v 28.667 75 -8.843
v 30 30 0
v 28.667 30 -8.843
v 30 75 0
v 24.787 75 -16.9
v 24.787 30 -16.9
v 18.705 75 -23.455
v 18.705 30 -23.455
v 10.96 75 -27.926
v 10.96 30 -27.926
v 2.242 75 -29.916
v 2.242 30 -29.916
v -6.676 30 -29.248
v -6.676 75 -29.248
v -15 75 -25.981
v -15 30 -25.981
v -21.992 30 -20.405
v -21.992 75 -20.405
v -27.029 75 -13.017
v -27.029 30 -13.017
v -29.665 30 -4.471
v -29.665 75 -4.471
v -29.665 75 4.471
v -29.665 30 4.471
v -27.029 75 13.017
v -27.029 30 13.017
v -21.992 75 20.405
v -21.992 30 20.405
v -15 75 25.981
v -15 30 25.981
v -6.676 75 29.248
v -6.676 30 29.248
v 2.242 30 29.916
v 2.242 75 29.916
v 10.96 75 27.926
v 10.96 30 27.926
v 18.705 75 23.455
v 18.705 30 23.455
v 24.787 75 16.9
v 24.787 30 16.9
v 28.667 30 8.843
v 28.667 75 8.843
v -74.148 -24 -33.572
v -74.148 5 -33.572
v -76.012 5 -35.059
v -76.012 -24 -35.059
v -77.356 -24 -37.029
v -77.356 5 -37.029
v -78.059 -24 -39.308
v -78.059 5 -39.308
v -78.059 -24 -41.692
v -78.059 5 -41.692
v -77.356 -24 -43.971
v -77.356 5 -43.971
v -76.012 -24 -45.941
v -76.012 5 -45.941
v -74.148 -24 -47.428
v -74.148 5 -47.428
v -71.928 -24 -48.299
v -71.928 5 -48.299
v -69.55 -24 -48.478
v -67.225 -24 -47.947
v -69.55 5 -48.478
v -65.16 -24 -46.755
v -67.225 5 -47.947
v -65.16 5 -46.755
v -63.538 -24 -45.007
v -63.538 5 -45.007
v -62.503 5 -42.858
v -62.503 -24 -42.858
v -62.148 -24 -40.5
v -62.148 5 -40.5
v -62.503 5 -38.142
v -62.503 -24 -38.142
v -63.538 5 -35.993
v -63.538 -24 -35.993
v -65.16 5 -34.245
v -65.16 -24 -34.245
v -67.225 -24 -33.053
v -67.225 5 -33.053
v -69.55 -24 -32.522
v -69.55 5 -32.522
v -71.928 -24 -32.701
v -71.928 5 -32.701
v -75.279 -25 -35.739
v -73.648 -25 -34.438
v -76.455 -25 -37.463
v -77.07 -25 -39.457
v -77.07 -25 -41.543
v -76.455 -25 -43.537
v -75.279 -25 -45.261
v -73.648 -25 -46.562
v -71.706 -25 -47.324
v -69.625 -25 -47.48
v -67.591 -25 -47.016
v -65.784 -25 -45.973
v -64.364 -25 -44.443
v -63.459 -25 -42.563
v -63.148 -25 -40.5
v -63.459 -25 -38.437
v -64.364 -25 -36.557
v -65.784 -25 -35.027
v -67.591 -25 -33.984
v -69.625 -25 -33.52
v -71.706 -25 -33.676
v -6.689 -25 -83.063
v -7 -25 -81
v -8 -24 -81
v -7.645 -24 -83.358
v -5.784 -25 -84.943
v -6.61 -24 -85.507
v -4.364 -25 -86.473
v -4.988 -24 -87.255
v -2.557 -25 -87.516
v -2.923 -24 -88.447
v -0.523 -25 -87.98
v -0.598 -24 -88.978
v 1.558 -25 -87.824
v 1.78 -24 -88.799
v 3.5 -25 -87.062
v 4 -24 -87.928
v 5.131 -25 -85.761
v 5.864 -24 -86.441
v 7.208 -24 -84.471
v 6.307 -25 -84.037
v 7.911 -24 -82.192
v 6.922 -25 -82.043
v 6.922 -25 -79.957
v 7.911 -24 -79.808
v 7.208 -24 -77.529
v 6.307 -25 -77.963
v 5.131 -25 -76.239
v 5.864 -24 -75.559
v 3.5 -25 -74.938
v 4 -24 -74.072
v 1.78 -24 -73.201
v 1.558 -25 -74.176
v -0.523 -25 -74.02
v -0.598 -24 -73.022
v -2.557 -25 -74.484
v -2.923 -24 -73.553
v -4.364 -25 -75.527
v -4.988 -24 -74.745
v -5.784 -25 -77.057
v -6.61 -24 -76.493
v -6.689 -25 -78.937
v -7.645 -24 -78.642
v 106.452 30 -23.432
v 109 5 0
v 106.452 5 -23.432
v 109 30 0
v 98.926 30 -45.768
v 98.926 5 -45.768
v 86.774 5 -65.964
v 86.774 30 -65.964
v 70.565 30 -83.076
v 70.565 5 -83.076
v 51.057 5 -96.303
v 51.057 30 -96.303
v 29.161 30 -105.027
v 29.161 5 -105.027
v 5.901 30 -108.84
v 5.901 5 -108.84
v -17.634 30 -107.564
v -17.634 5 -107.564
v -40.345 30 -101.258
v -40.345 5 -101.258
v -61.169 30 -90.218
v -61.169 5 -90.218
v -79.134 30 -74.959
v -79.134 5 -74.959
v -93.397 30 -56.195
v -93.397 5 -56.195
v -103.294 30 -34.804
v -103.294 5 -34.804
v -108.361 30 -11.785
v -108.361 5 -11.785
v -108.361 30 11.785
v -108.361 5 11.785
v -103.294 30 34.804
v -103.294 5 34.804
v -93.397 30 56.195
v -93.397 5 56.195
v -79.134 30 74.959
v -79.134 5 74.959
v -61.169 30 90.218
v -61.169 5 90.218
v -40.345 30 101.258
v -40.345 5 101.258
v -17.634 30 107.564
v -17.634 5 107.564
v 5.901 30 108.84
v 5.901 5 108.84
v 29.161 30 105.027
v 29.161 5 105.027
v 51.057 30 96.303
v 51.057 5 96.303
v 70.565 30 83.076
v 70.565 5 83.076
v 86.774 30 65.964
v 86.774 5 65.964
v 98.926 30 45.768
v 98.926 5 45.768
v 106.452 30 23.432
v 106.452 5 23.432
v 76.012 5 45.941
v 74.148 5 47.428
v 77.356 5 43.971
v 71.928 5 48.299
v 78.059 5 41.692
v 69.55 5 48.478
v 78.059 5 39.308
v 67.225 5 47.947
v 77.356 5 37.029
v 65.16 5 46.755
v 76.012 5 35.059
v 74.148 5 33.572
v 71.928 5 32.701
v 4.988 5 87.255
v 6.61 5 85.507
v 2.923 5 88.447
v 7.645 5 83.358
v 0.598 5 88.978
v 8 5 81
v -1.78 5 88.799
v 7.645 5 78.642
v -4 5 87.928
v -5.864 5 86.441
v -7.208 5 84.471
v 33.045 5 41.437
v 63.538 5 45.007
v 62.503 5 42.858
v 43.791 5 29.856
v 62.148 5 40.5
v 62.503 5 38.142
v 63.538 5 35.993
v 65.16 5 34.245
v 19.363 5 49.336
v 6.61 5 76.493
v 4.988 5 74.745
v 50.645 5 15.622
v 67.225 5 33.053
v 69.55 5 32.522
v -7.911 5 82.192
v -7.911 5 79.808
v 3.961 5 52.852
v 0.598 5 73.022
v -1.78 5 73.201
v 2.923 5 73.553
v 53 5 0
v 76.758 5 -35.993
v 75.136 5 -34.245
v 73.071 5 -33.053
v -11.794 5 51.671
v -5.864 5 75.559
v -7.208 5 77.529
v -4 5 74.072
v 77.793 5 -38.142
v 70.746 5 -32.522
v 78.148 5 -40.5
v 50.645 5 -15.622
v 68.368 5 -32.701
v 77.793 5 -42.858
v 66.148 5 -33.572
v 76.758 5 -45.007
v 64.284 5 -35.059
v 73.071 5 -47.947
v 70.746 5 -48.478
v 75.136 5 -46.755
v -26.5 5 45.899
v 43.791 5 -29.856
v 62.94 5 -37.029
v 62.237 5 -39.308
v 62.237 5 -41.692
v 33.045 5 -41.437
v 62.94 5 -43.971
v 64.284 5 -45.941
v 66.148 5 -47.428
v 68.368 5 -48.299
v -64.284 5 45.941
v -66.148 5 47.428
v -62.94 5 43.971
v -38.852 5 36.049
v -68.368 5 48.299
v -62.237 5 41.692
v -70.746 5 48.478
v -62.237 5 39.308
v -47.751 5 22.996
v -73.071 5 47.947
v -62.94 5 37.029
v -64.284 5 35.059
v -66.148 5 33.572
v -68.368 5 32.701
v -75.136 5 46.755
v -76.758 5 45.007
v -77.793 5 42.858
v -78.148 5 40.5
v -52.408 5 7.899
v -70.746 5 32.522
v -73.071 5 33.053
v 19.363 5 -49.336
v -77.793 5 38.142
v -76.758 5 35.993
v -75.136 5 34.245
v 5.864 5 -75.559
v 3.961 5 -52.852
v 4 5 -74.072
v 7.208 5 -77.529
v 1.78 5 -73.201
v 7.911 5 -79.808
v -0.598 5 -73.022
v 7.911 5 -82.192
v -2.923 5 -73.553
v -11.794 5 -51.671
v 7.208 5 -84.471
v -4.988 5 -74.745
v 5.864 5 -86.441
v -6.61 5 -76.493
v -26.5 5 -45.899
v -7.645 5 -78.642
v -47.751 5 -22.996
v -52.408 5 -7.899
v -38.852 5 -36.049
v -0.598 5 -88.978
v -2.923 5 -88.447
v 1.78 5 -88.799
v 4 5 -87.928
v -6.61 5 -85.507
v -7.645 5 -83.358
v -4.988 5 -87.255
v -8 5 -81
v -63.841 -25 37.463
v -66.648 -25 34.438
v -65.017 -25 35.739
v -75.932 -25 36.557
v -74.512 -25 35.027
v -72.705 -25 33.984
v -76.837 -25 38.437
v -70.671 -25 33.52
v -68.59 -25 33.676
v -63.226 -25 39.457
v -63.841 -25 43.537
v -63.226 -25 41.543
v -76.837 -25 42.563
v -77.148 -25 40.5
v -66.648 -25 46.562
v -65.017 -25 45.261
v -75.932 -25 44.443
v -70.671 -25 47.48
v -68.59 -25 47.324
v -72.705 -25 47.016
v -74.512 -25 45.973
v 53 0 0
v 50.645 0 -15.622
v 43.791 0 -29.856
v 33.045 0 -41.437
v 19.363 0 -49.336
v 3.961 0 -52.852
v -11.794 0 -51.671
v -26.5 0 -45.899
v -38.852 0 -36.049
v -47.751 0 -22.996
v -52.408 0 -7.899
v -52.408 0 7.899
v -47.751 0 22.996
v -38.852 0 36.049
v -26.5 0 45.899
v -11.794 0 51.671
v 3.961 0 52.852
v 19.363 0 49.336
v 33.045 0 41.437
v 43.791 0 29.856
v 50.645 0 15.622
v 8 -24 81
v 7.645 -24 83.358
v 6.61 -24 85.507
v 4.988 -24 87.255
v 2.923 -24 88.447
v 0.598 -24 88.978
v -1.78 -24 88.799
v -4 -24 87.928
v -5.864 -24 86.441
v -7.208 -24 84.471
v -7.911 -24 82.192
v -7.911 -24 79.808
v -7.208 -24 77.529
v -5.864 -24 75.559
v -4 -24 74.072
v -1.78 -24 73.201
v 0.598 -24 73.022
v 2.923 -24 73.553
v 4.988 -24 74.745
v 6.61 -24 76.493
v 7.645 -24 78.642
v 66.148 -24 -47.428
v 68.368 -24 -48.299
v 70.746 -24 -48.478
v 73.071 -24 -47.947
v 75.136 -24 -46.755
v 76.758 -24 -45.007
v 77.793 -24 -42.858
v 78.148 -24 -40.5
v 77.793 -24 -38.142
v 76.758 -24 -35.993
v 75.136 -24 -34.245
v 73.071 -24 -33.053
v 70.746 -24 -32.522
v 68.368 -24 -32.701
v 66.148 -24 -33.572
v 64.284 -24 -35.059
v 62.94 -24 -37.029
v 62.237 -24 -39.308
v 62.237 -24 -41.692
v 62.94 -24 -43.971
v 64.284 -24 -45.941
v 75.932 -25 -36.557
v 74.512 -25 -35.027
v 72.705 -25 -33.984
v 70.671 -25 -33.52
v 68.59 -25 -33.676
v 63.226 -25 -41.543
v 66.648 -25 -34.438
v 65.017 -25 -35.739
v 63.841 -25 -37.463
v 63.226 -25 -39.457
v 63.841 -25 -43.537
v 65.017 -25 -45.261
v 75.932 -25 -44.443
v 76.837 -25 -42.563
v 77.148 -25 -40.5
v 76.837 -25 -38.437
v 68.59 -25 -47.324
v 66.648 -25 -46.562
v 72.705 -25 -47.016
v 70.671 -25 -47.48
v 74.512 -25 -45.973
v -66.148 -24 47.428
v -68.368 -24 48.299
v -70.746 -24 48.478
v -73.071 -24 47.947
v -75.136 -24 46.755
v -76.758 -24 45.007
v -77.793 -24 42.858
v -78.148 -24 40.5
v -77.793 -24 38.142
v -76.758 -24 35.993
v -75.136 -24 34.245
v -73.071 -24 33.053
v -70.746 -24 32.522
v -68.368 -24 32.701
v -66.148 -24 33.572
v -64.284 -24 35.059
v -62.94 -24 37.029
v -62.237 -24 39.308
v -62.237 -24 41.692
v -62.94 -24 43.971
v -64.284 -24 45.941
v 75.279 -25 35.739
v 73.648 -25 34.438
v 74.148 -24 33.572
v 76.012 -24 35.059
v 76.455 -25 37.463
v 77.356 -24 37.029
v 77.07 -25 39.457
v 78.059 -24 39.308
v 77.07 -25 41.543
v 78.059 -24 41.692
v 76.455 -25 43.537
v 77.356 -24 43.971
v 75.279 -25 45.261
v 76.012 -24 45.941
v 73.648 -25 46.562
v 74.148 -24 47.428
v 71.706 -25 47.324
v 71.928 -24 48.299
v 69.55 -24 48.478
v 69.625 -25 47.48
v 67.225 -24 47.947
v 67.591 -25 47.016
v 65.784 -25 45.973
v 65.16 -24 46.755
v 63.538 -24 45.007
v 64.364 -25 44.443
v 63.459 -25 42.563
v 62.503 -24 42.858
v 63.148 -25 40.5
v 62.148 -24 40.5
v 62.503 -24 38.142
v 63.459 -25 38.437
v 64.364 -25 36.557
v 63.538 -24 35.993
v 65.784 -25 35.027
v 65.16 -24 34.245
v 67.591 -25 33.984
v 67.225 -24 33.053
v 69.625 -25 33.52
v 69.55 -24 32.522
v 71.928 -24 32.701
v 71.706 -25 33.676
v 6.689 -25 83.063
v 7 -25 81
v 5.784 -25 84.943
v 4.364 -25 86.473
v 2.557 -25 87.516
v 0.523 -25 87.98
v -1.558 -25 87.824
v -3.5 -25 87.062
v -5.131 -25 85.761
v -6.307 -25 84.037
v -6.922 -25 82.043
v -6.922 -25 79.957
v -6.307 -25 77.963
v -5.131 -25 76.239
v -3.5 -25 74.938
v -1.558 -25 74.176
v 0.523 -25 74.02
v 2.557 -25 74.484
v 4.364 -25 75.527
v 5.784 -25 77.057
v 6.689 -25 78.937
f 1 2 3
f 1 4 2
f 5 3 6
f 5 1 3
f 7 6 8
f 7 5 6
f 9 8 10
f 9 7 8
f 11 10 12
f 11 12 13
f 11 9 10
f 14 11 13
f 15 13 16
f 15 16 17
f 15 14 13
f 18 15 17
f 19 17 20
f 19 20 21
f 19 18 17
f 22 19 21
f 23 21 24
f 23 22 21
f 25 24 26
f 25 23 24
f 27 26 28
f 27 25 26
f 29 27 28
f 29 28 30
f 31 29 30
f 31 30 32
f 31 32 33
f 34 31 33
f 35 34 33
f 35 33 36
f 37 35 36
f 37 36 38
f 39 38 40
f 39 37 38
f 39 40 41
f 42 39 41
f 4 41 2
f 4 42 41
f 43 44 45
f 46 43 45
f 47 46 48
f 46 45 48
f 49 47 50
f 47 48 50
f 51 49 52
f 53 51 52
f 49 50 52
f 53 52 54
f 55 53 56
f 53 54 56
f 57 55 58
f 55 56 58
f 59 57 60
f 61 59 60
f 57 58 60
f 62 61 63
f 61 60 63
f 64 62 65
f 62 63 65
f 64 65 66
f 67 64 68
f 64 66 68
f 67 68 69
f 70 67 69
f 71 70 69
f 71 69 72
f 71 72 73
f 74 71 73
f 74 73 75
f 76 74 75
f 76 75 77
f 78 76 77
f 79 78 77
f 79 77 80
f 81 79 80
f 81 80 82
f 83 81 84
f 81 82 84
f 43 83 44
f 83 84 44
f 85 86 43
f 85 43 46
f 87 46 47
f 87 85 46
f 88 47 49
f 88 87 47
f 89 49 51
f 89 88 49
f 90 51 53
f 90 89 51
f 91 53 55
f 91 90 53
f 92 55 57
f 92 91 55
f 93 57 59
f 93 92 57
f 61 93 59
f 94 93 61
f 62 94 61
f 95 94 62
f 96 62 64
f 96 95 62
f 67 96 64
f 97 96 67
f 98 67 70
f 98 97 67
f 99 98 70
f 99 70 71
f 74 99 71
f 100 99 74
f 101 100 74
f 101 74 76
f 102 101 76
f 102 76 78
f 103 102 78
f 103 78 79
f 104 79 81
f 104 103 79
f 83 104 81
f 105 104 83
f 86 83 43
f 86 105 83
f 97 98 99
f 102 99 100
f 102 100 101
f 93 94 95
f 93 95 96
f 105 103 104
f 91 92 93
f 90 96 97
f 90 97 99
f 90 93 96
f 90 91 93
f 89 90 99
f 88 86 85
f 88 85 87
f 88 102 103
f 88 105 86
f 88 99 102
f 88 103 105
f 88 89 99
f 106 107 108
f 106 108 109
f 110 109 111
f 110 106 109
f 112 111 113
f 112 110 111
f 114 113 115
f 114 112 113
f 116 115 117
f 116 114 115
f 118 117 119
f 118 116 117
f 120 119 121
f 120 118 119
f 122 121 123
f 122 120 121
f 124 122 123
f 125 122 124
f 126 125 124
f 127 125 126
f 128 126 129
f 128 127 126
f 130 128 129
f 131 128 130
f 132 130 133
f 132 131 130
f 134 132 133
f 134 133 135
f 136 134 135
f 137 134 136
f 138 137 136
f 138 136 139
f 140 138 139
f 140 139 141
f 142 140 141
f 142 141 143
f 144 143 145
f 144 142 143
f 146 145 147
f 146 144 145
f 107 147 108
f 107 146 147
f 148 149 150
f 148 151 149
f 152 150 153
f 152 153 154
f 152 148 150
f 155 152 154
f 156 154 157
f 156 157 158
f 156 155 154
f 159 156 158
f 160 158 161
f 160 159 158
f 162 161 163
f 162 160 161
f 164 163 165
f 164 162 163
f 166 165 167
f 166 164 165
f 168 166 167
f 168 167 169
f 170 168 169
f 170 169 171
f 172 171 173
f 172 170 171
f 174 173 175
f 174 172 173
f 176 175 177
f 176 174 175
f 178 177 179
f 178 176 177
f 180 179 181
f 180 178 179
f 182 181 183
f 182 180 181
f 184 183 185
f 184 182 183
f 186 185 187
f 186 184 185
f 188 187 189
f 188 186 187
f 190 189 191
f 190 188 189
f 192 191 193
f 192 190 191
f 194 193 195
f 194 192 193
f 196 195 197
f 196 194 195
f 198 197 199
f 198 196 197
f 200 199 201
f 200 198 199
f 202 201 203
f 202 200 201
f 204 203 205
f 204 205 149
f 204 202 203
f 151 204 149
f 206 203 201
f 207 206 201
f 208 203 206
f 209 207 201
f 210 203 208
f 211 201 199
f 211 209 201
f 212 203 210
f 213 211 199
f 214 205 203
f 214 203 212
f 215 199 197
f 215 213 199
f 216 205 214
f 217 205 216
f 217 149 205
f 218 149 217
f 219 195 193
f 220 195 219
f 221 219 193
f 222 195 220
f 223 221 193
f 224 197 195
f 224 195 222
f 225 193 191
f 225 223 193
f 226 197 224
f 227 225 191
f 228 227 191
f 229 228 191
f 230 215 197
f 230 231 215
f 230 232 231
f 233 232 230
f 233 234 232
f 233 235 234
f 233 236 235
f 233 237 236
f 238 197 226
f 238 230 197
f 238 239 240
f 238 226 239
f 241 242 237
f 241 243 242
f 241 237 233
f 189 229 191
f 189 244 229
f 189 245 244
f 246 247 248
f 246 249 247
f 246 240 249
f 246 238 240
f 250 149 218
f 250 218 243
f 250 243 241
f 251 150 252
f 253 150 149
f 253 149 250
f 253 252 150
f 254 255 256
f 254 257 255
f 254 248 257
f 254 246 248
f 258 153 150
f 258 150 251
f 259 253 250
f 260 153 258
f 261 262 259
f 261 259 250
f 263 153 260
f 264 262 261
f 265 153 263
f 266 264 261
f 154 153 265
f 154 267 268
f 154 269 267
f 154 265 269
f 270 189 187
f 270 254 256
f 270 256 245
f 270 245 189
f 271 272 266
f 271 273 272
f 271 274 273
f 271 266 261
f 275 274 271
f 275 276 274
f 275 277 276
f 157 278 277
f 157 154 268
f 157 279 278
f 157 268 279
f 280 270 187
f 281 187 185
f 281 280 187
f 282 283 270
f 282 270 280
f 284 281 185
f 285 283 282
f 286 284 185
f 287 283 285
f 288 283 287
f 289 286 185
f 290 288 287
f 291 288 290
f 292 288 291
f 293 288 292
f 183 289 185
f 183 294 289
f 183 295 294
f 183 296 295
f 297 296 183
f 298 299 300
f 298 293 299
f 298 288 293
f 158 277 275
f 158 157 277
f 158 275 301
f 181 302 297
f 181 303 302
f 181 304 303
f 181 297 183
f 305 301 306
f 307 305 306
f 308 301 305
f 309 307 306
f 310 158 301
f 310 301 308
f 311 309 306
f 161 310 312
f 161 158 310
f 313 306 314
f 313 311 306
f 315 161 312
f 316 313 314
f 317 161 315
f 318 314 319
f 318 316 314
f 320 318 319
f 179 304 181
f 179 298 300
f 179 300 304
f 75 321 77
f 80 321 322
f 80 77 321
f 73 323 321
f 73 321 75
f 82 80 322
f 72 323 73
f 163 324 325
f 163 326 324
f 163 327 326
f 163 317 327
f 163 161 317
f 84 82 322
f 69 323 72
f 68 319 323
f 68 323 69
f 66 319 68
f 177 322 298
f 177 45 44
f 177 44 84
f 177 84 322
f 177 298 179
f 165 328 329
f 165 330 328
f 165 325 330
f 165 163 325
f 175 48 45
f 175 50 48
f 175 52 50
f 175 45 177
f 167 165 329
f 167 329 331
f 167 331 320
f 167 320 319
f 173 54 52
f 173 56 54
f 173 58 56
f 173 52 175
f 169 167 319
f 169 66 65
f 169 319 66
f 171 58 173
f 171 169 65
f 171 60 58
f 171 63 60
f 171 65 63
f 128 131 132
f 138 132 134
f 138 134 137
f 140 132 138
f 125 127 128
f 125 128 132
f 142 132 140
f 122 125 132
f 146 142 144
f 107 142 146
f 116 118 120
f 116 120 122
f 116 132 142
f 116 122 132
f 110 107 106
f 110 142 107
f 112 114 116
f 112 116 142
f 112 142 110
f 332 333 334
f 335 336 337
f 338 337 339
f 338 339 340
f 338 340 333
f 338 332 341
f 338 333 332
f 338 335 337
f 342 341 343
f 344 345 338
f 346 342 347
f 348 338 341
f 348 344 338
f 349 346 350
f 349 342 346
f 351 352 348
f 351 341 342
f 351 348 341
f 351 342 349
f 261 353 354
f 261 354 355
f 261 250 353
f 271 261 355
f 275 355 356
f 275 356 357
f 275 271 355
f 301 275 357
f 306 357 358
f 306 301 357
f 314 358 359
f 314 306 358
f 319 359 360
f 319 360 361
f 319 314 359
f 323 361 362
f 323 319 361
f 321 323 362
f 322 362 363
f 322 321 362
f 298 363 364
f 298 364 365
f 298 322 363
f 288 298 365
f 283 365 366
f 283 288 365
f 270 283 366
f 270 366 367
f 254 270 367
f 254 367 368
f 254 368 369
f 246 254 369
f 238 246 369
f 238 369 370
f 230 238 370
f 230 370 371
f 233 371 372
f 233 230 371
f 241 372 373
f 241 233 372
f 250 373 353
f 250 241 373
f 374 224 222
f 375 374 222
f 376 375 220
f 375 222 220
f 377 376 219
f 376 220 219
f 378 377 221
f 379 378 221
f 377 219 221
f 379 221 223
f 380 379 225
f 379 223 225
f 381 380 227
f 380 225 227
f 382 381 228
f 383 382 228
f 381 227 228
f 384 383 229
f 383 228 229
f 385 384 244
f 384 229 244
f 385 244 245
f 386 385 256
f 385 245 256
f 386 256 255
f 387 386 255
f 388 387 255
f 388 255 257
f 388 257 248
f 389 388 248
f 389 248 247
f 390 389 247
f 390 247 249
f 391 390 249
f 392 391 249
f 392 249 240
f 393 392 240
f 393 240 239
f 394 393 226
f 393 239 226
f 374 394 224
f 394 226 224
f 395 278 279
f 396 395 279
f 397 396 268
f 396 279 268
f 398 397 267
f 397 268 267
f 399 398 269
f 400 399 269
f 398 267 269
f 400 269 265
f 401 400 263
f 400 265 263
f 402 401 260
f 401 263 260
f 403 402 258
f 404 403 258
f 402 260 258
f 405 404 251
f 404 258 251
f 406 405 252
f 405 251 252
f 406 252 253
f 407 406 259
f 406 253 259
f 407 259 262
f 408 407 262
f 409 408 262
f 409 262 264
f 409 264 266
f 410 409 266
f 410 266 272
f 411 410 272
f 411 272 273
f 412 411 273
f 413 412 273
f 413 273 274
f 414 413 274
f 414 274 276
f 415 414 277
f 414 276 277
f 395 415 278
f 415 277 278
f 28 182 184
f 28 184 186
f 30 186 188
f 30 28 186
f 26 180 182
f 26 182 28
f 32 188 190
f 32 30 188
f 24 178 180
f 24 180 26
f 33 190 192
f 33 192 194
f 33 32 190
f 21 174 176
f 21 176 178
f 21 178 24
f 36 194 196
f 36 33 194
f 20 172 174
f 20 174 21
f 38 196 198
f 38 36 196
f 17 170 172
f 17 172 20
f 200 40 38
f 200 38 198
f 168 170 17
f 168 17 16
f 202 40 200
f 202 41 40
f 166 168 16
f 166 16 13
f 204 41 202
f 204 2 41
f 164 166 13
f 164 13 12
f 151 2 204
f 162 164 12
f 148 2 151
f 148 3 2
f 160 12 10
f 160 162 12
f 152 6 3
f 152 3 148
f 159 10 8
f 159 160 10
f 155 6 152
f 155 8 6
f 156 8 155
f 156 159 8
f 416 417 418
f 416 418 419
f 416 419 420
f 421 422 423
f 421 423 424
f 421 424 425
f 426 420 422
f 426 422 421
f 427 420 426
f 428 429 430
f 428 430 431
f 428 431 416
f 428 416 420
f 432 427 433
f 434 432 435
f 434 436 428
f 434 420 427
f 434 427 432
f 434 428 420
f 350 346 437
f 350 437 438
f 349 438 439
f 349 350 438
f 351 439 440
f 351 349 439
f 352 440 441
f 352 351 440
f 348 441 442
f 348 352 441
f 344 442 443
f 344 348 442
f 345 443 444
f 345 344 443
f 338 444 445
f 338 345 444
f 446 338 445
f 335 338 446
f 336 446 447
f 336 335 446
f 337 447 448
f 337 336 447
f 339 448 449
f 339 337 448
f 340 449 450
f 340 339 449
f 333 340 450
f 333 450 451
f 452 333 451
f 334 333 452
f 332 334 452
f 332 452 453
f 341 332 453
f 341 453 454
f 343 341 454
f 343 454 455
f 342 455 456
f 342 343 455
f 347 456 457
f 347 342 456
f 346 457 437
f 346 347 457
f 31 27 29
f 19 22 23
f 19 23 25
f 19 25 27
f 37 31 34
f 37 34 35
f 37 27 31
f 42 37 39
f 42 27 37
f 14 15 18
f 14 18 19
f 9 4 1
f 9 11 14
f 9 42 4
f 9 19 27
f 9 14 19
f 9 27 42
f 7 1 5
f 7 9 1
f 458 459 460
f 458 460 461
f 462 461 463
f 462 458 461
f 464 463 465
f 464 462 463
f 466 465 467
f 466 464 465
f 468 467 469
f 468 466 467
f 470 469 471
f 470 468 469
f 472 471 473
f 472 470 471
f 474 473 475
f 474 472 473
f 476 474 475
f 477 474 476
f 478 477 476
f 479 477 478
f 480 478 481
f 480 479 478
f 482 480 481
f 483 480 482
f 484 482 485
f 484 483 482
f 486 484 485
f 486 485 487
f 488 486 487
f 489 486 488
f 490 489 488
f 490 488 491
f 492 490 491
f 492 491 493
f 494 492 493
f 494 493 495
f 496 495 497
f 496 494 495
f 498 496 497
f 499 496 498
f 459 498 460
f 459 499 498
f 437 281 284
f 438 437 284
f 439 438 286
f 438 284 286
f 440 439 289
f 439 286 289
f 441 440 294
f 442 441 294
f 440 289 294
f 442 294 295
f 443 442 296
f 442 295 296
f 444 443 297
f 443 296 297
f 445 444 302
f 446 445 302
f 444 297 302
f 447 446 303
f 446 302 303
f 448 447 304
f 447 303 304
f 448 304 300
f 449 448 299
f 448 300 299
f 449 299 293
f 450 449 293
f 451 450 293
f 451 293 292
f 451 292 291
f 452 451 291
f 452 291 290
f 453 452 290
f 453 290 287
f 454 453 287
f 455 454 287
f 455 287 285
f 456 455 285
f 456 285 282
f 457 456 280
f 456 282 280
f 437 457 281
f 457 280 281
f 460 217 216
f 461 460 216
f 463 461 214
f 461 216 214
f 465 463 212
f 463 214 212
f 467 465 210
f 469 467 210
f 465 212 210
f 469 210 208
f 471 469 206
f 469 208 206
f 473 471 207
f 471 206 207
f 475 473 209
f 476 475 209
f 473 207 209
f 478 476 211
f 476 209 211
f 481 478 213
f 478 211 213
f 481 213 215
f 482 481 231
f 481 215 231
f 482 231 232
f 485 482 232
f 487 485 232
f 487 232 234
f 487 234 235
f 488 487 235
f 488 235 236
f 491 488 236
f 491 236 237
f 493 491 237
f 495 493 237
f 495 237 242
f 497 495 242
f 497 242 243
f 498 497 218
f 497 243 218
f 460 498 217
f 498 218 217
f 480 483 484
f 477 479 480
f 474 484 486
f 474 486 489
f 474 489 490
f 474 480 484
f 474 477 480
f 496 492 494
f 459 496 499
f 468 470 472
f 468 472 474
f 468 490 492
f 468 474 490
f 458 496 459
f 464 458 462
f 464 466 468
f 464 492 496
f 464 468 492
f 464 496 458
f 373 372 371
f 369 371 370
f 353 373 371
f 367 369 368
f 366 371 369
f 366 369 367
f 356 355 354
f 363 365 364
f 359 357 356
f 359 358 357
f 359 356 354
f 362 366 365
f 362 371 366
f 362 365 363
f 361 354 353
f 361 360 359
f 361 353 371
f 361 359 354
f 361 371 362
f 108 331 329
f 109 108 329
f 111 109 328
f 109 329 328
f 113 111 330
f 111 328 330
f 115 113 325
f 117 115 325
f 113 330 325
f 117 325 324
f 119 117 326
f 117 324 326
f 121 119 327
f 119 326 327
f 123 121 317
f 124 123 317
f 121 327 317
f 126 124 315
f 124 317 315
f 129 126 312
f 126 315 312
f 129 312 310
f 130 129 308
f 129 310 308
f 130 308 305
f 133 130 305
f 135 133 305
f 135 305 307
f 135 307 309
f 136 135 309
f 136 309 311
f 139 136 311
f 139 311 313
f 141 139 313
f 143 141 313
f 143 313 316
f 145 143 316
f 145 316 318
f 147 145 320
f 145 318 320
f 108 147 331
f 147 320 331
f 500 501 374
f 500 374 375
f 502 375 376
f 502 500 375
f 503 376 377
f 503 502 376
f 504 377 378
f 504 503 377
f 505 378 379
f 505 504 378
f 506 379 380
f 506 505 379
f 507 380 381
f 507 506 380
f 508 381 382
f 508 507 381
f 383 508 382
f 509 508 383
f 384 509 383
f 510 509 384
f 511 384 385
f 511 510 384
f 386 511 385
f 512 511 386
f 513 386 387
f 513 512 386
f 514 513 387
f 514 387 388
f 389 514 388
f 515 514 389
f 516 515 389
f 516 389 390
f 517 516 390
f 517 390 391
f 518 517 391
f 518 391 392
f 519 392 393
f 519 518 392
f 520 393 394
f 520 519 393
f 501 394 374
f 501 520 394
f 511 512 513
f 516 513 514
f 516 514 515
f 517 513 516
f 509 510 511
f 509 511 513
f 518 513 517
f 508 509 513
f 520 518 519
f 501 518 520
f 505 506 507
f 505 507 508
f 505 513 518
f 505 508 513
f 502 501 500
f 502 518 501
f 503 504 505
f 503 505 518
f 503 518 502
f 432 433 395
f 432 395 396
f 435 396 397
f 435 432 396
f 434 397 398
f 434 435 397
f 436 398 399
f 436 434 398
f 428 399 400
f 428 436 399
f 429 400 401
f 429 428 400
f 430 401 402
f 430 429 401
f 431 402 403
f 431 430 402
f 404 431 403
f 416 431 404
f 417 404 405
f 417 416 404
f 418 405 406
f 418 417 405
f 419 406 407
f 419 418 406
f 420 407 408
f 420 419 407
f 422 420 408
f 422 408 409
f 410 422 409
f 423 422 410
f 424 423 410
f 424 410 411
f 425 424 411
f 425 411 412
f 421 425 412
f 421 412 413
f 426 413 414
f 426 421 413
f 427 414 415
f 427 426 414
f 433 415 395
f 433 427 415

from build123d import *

# Parameters (mm, degrees)
SKETCH2_R                    = 8
BOSS_EXTRUDE1_DEPTH          = 30
CHAMFER1_SIZE                = 1
CIRPATTERN3_COUNT            = 6
CHAMFER1_OF_CIRPATTERN3_SIZE = 1


with BuildPart() as part:
    # Sketch1 → Revolve1 (revolve)
    with BuildSketch(Plane.XY):
        Polygon((0, 0), (53, 0), (53, 5), (109, 5), (109, 30), (30, 30), (30, 75), (0, 75), align=None)
    revolve(axis=Axis((0, 0, 0), (0, 1, 0)))

    # Sketch2 → Boss-Extrude1 (add)
    with BuildSketch(Plane.XZ.offset(-5)):
        with Locations((0, 81)):
            Circle(SKETCH2_R)
    boss_extrude1 = extrude(amount=BOSS_EXTRUDE1_DEPTH)

    # Chamfer1
    chamfer1_edges = [part.edges().sort_by_distance(p)[0] for p in [
        (-8, -25, 81),
    ]]
    chamfer(chamfer1_edges, length=CHAMFER1_SIZE)

    # CirPattern3: Boss-Extrude1 ×6 about axis
    cirpattern3_axis = Axis((0, 0, 0), (0, 1, 0))
    for i in range(1, CIRPATTERN3_COUNT):
        add(boss_extrude1.rotate(cirpattern3_axis, i * 360 / CIRPATTERN3_COUNT))

    # Chamfer1 of CirPattern3
    chamfer1_of_cirpattern3_edges = [part.edges().sort_by_distance(p)[0] for p in [
        (66.148057707, -25, 47.42820323),
        (74.148057707, -25, -33.57179677),
        (8, -25, -81),
        (-66.148057707, -25, -47.42820323),
        (-74.148057707, -25, 33.57179677),
    ]]
    chamfer(chamfer1_of_cirpattern3_edges, length=CHAMFER1_OF_CIRPATTERN3_SIZE)


solid = part.part
